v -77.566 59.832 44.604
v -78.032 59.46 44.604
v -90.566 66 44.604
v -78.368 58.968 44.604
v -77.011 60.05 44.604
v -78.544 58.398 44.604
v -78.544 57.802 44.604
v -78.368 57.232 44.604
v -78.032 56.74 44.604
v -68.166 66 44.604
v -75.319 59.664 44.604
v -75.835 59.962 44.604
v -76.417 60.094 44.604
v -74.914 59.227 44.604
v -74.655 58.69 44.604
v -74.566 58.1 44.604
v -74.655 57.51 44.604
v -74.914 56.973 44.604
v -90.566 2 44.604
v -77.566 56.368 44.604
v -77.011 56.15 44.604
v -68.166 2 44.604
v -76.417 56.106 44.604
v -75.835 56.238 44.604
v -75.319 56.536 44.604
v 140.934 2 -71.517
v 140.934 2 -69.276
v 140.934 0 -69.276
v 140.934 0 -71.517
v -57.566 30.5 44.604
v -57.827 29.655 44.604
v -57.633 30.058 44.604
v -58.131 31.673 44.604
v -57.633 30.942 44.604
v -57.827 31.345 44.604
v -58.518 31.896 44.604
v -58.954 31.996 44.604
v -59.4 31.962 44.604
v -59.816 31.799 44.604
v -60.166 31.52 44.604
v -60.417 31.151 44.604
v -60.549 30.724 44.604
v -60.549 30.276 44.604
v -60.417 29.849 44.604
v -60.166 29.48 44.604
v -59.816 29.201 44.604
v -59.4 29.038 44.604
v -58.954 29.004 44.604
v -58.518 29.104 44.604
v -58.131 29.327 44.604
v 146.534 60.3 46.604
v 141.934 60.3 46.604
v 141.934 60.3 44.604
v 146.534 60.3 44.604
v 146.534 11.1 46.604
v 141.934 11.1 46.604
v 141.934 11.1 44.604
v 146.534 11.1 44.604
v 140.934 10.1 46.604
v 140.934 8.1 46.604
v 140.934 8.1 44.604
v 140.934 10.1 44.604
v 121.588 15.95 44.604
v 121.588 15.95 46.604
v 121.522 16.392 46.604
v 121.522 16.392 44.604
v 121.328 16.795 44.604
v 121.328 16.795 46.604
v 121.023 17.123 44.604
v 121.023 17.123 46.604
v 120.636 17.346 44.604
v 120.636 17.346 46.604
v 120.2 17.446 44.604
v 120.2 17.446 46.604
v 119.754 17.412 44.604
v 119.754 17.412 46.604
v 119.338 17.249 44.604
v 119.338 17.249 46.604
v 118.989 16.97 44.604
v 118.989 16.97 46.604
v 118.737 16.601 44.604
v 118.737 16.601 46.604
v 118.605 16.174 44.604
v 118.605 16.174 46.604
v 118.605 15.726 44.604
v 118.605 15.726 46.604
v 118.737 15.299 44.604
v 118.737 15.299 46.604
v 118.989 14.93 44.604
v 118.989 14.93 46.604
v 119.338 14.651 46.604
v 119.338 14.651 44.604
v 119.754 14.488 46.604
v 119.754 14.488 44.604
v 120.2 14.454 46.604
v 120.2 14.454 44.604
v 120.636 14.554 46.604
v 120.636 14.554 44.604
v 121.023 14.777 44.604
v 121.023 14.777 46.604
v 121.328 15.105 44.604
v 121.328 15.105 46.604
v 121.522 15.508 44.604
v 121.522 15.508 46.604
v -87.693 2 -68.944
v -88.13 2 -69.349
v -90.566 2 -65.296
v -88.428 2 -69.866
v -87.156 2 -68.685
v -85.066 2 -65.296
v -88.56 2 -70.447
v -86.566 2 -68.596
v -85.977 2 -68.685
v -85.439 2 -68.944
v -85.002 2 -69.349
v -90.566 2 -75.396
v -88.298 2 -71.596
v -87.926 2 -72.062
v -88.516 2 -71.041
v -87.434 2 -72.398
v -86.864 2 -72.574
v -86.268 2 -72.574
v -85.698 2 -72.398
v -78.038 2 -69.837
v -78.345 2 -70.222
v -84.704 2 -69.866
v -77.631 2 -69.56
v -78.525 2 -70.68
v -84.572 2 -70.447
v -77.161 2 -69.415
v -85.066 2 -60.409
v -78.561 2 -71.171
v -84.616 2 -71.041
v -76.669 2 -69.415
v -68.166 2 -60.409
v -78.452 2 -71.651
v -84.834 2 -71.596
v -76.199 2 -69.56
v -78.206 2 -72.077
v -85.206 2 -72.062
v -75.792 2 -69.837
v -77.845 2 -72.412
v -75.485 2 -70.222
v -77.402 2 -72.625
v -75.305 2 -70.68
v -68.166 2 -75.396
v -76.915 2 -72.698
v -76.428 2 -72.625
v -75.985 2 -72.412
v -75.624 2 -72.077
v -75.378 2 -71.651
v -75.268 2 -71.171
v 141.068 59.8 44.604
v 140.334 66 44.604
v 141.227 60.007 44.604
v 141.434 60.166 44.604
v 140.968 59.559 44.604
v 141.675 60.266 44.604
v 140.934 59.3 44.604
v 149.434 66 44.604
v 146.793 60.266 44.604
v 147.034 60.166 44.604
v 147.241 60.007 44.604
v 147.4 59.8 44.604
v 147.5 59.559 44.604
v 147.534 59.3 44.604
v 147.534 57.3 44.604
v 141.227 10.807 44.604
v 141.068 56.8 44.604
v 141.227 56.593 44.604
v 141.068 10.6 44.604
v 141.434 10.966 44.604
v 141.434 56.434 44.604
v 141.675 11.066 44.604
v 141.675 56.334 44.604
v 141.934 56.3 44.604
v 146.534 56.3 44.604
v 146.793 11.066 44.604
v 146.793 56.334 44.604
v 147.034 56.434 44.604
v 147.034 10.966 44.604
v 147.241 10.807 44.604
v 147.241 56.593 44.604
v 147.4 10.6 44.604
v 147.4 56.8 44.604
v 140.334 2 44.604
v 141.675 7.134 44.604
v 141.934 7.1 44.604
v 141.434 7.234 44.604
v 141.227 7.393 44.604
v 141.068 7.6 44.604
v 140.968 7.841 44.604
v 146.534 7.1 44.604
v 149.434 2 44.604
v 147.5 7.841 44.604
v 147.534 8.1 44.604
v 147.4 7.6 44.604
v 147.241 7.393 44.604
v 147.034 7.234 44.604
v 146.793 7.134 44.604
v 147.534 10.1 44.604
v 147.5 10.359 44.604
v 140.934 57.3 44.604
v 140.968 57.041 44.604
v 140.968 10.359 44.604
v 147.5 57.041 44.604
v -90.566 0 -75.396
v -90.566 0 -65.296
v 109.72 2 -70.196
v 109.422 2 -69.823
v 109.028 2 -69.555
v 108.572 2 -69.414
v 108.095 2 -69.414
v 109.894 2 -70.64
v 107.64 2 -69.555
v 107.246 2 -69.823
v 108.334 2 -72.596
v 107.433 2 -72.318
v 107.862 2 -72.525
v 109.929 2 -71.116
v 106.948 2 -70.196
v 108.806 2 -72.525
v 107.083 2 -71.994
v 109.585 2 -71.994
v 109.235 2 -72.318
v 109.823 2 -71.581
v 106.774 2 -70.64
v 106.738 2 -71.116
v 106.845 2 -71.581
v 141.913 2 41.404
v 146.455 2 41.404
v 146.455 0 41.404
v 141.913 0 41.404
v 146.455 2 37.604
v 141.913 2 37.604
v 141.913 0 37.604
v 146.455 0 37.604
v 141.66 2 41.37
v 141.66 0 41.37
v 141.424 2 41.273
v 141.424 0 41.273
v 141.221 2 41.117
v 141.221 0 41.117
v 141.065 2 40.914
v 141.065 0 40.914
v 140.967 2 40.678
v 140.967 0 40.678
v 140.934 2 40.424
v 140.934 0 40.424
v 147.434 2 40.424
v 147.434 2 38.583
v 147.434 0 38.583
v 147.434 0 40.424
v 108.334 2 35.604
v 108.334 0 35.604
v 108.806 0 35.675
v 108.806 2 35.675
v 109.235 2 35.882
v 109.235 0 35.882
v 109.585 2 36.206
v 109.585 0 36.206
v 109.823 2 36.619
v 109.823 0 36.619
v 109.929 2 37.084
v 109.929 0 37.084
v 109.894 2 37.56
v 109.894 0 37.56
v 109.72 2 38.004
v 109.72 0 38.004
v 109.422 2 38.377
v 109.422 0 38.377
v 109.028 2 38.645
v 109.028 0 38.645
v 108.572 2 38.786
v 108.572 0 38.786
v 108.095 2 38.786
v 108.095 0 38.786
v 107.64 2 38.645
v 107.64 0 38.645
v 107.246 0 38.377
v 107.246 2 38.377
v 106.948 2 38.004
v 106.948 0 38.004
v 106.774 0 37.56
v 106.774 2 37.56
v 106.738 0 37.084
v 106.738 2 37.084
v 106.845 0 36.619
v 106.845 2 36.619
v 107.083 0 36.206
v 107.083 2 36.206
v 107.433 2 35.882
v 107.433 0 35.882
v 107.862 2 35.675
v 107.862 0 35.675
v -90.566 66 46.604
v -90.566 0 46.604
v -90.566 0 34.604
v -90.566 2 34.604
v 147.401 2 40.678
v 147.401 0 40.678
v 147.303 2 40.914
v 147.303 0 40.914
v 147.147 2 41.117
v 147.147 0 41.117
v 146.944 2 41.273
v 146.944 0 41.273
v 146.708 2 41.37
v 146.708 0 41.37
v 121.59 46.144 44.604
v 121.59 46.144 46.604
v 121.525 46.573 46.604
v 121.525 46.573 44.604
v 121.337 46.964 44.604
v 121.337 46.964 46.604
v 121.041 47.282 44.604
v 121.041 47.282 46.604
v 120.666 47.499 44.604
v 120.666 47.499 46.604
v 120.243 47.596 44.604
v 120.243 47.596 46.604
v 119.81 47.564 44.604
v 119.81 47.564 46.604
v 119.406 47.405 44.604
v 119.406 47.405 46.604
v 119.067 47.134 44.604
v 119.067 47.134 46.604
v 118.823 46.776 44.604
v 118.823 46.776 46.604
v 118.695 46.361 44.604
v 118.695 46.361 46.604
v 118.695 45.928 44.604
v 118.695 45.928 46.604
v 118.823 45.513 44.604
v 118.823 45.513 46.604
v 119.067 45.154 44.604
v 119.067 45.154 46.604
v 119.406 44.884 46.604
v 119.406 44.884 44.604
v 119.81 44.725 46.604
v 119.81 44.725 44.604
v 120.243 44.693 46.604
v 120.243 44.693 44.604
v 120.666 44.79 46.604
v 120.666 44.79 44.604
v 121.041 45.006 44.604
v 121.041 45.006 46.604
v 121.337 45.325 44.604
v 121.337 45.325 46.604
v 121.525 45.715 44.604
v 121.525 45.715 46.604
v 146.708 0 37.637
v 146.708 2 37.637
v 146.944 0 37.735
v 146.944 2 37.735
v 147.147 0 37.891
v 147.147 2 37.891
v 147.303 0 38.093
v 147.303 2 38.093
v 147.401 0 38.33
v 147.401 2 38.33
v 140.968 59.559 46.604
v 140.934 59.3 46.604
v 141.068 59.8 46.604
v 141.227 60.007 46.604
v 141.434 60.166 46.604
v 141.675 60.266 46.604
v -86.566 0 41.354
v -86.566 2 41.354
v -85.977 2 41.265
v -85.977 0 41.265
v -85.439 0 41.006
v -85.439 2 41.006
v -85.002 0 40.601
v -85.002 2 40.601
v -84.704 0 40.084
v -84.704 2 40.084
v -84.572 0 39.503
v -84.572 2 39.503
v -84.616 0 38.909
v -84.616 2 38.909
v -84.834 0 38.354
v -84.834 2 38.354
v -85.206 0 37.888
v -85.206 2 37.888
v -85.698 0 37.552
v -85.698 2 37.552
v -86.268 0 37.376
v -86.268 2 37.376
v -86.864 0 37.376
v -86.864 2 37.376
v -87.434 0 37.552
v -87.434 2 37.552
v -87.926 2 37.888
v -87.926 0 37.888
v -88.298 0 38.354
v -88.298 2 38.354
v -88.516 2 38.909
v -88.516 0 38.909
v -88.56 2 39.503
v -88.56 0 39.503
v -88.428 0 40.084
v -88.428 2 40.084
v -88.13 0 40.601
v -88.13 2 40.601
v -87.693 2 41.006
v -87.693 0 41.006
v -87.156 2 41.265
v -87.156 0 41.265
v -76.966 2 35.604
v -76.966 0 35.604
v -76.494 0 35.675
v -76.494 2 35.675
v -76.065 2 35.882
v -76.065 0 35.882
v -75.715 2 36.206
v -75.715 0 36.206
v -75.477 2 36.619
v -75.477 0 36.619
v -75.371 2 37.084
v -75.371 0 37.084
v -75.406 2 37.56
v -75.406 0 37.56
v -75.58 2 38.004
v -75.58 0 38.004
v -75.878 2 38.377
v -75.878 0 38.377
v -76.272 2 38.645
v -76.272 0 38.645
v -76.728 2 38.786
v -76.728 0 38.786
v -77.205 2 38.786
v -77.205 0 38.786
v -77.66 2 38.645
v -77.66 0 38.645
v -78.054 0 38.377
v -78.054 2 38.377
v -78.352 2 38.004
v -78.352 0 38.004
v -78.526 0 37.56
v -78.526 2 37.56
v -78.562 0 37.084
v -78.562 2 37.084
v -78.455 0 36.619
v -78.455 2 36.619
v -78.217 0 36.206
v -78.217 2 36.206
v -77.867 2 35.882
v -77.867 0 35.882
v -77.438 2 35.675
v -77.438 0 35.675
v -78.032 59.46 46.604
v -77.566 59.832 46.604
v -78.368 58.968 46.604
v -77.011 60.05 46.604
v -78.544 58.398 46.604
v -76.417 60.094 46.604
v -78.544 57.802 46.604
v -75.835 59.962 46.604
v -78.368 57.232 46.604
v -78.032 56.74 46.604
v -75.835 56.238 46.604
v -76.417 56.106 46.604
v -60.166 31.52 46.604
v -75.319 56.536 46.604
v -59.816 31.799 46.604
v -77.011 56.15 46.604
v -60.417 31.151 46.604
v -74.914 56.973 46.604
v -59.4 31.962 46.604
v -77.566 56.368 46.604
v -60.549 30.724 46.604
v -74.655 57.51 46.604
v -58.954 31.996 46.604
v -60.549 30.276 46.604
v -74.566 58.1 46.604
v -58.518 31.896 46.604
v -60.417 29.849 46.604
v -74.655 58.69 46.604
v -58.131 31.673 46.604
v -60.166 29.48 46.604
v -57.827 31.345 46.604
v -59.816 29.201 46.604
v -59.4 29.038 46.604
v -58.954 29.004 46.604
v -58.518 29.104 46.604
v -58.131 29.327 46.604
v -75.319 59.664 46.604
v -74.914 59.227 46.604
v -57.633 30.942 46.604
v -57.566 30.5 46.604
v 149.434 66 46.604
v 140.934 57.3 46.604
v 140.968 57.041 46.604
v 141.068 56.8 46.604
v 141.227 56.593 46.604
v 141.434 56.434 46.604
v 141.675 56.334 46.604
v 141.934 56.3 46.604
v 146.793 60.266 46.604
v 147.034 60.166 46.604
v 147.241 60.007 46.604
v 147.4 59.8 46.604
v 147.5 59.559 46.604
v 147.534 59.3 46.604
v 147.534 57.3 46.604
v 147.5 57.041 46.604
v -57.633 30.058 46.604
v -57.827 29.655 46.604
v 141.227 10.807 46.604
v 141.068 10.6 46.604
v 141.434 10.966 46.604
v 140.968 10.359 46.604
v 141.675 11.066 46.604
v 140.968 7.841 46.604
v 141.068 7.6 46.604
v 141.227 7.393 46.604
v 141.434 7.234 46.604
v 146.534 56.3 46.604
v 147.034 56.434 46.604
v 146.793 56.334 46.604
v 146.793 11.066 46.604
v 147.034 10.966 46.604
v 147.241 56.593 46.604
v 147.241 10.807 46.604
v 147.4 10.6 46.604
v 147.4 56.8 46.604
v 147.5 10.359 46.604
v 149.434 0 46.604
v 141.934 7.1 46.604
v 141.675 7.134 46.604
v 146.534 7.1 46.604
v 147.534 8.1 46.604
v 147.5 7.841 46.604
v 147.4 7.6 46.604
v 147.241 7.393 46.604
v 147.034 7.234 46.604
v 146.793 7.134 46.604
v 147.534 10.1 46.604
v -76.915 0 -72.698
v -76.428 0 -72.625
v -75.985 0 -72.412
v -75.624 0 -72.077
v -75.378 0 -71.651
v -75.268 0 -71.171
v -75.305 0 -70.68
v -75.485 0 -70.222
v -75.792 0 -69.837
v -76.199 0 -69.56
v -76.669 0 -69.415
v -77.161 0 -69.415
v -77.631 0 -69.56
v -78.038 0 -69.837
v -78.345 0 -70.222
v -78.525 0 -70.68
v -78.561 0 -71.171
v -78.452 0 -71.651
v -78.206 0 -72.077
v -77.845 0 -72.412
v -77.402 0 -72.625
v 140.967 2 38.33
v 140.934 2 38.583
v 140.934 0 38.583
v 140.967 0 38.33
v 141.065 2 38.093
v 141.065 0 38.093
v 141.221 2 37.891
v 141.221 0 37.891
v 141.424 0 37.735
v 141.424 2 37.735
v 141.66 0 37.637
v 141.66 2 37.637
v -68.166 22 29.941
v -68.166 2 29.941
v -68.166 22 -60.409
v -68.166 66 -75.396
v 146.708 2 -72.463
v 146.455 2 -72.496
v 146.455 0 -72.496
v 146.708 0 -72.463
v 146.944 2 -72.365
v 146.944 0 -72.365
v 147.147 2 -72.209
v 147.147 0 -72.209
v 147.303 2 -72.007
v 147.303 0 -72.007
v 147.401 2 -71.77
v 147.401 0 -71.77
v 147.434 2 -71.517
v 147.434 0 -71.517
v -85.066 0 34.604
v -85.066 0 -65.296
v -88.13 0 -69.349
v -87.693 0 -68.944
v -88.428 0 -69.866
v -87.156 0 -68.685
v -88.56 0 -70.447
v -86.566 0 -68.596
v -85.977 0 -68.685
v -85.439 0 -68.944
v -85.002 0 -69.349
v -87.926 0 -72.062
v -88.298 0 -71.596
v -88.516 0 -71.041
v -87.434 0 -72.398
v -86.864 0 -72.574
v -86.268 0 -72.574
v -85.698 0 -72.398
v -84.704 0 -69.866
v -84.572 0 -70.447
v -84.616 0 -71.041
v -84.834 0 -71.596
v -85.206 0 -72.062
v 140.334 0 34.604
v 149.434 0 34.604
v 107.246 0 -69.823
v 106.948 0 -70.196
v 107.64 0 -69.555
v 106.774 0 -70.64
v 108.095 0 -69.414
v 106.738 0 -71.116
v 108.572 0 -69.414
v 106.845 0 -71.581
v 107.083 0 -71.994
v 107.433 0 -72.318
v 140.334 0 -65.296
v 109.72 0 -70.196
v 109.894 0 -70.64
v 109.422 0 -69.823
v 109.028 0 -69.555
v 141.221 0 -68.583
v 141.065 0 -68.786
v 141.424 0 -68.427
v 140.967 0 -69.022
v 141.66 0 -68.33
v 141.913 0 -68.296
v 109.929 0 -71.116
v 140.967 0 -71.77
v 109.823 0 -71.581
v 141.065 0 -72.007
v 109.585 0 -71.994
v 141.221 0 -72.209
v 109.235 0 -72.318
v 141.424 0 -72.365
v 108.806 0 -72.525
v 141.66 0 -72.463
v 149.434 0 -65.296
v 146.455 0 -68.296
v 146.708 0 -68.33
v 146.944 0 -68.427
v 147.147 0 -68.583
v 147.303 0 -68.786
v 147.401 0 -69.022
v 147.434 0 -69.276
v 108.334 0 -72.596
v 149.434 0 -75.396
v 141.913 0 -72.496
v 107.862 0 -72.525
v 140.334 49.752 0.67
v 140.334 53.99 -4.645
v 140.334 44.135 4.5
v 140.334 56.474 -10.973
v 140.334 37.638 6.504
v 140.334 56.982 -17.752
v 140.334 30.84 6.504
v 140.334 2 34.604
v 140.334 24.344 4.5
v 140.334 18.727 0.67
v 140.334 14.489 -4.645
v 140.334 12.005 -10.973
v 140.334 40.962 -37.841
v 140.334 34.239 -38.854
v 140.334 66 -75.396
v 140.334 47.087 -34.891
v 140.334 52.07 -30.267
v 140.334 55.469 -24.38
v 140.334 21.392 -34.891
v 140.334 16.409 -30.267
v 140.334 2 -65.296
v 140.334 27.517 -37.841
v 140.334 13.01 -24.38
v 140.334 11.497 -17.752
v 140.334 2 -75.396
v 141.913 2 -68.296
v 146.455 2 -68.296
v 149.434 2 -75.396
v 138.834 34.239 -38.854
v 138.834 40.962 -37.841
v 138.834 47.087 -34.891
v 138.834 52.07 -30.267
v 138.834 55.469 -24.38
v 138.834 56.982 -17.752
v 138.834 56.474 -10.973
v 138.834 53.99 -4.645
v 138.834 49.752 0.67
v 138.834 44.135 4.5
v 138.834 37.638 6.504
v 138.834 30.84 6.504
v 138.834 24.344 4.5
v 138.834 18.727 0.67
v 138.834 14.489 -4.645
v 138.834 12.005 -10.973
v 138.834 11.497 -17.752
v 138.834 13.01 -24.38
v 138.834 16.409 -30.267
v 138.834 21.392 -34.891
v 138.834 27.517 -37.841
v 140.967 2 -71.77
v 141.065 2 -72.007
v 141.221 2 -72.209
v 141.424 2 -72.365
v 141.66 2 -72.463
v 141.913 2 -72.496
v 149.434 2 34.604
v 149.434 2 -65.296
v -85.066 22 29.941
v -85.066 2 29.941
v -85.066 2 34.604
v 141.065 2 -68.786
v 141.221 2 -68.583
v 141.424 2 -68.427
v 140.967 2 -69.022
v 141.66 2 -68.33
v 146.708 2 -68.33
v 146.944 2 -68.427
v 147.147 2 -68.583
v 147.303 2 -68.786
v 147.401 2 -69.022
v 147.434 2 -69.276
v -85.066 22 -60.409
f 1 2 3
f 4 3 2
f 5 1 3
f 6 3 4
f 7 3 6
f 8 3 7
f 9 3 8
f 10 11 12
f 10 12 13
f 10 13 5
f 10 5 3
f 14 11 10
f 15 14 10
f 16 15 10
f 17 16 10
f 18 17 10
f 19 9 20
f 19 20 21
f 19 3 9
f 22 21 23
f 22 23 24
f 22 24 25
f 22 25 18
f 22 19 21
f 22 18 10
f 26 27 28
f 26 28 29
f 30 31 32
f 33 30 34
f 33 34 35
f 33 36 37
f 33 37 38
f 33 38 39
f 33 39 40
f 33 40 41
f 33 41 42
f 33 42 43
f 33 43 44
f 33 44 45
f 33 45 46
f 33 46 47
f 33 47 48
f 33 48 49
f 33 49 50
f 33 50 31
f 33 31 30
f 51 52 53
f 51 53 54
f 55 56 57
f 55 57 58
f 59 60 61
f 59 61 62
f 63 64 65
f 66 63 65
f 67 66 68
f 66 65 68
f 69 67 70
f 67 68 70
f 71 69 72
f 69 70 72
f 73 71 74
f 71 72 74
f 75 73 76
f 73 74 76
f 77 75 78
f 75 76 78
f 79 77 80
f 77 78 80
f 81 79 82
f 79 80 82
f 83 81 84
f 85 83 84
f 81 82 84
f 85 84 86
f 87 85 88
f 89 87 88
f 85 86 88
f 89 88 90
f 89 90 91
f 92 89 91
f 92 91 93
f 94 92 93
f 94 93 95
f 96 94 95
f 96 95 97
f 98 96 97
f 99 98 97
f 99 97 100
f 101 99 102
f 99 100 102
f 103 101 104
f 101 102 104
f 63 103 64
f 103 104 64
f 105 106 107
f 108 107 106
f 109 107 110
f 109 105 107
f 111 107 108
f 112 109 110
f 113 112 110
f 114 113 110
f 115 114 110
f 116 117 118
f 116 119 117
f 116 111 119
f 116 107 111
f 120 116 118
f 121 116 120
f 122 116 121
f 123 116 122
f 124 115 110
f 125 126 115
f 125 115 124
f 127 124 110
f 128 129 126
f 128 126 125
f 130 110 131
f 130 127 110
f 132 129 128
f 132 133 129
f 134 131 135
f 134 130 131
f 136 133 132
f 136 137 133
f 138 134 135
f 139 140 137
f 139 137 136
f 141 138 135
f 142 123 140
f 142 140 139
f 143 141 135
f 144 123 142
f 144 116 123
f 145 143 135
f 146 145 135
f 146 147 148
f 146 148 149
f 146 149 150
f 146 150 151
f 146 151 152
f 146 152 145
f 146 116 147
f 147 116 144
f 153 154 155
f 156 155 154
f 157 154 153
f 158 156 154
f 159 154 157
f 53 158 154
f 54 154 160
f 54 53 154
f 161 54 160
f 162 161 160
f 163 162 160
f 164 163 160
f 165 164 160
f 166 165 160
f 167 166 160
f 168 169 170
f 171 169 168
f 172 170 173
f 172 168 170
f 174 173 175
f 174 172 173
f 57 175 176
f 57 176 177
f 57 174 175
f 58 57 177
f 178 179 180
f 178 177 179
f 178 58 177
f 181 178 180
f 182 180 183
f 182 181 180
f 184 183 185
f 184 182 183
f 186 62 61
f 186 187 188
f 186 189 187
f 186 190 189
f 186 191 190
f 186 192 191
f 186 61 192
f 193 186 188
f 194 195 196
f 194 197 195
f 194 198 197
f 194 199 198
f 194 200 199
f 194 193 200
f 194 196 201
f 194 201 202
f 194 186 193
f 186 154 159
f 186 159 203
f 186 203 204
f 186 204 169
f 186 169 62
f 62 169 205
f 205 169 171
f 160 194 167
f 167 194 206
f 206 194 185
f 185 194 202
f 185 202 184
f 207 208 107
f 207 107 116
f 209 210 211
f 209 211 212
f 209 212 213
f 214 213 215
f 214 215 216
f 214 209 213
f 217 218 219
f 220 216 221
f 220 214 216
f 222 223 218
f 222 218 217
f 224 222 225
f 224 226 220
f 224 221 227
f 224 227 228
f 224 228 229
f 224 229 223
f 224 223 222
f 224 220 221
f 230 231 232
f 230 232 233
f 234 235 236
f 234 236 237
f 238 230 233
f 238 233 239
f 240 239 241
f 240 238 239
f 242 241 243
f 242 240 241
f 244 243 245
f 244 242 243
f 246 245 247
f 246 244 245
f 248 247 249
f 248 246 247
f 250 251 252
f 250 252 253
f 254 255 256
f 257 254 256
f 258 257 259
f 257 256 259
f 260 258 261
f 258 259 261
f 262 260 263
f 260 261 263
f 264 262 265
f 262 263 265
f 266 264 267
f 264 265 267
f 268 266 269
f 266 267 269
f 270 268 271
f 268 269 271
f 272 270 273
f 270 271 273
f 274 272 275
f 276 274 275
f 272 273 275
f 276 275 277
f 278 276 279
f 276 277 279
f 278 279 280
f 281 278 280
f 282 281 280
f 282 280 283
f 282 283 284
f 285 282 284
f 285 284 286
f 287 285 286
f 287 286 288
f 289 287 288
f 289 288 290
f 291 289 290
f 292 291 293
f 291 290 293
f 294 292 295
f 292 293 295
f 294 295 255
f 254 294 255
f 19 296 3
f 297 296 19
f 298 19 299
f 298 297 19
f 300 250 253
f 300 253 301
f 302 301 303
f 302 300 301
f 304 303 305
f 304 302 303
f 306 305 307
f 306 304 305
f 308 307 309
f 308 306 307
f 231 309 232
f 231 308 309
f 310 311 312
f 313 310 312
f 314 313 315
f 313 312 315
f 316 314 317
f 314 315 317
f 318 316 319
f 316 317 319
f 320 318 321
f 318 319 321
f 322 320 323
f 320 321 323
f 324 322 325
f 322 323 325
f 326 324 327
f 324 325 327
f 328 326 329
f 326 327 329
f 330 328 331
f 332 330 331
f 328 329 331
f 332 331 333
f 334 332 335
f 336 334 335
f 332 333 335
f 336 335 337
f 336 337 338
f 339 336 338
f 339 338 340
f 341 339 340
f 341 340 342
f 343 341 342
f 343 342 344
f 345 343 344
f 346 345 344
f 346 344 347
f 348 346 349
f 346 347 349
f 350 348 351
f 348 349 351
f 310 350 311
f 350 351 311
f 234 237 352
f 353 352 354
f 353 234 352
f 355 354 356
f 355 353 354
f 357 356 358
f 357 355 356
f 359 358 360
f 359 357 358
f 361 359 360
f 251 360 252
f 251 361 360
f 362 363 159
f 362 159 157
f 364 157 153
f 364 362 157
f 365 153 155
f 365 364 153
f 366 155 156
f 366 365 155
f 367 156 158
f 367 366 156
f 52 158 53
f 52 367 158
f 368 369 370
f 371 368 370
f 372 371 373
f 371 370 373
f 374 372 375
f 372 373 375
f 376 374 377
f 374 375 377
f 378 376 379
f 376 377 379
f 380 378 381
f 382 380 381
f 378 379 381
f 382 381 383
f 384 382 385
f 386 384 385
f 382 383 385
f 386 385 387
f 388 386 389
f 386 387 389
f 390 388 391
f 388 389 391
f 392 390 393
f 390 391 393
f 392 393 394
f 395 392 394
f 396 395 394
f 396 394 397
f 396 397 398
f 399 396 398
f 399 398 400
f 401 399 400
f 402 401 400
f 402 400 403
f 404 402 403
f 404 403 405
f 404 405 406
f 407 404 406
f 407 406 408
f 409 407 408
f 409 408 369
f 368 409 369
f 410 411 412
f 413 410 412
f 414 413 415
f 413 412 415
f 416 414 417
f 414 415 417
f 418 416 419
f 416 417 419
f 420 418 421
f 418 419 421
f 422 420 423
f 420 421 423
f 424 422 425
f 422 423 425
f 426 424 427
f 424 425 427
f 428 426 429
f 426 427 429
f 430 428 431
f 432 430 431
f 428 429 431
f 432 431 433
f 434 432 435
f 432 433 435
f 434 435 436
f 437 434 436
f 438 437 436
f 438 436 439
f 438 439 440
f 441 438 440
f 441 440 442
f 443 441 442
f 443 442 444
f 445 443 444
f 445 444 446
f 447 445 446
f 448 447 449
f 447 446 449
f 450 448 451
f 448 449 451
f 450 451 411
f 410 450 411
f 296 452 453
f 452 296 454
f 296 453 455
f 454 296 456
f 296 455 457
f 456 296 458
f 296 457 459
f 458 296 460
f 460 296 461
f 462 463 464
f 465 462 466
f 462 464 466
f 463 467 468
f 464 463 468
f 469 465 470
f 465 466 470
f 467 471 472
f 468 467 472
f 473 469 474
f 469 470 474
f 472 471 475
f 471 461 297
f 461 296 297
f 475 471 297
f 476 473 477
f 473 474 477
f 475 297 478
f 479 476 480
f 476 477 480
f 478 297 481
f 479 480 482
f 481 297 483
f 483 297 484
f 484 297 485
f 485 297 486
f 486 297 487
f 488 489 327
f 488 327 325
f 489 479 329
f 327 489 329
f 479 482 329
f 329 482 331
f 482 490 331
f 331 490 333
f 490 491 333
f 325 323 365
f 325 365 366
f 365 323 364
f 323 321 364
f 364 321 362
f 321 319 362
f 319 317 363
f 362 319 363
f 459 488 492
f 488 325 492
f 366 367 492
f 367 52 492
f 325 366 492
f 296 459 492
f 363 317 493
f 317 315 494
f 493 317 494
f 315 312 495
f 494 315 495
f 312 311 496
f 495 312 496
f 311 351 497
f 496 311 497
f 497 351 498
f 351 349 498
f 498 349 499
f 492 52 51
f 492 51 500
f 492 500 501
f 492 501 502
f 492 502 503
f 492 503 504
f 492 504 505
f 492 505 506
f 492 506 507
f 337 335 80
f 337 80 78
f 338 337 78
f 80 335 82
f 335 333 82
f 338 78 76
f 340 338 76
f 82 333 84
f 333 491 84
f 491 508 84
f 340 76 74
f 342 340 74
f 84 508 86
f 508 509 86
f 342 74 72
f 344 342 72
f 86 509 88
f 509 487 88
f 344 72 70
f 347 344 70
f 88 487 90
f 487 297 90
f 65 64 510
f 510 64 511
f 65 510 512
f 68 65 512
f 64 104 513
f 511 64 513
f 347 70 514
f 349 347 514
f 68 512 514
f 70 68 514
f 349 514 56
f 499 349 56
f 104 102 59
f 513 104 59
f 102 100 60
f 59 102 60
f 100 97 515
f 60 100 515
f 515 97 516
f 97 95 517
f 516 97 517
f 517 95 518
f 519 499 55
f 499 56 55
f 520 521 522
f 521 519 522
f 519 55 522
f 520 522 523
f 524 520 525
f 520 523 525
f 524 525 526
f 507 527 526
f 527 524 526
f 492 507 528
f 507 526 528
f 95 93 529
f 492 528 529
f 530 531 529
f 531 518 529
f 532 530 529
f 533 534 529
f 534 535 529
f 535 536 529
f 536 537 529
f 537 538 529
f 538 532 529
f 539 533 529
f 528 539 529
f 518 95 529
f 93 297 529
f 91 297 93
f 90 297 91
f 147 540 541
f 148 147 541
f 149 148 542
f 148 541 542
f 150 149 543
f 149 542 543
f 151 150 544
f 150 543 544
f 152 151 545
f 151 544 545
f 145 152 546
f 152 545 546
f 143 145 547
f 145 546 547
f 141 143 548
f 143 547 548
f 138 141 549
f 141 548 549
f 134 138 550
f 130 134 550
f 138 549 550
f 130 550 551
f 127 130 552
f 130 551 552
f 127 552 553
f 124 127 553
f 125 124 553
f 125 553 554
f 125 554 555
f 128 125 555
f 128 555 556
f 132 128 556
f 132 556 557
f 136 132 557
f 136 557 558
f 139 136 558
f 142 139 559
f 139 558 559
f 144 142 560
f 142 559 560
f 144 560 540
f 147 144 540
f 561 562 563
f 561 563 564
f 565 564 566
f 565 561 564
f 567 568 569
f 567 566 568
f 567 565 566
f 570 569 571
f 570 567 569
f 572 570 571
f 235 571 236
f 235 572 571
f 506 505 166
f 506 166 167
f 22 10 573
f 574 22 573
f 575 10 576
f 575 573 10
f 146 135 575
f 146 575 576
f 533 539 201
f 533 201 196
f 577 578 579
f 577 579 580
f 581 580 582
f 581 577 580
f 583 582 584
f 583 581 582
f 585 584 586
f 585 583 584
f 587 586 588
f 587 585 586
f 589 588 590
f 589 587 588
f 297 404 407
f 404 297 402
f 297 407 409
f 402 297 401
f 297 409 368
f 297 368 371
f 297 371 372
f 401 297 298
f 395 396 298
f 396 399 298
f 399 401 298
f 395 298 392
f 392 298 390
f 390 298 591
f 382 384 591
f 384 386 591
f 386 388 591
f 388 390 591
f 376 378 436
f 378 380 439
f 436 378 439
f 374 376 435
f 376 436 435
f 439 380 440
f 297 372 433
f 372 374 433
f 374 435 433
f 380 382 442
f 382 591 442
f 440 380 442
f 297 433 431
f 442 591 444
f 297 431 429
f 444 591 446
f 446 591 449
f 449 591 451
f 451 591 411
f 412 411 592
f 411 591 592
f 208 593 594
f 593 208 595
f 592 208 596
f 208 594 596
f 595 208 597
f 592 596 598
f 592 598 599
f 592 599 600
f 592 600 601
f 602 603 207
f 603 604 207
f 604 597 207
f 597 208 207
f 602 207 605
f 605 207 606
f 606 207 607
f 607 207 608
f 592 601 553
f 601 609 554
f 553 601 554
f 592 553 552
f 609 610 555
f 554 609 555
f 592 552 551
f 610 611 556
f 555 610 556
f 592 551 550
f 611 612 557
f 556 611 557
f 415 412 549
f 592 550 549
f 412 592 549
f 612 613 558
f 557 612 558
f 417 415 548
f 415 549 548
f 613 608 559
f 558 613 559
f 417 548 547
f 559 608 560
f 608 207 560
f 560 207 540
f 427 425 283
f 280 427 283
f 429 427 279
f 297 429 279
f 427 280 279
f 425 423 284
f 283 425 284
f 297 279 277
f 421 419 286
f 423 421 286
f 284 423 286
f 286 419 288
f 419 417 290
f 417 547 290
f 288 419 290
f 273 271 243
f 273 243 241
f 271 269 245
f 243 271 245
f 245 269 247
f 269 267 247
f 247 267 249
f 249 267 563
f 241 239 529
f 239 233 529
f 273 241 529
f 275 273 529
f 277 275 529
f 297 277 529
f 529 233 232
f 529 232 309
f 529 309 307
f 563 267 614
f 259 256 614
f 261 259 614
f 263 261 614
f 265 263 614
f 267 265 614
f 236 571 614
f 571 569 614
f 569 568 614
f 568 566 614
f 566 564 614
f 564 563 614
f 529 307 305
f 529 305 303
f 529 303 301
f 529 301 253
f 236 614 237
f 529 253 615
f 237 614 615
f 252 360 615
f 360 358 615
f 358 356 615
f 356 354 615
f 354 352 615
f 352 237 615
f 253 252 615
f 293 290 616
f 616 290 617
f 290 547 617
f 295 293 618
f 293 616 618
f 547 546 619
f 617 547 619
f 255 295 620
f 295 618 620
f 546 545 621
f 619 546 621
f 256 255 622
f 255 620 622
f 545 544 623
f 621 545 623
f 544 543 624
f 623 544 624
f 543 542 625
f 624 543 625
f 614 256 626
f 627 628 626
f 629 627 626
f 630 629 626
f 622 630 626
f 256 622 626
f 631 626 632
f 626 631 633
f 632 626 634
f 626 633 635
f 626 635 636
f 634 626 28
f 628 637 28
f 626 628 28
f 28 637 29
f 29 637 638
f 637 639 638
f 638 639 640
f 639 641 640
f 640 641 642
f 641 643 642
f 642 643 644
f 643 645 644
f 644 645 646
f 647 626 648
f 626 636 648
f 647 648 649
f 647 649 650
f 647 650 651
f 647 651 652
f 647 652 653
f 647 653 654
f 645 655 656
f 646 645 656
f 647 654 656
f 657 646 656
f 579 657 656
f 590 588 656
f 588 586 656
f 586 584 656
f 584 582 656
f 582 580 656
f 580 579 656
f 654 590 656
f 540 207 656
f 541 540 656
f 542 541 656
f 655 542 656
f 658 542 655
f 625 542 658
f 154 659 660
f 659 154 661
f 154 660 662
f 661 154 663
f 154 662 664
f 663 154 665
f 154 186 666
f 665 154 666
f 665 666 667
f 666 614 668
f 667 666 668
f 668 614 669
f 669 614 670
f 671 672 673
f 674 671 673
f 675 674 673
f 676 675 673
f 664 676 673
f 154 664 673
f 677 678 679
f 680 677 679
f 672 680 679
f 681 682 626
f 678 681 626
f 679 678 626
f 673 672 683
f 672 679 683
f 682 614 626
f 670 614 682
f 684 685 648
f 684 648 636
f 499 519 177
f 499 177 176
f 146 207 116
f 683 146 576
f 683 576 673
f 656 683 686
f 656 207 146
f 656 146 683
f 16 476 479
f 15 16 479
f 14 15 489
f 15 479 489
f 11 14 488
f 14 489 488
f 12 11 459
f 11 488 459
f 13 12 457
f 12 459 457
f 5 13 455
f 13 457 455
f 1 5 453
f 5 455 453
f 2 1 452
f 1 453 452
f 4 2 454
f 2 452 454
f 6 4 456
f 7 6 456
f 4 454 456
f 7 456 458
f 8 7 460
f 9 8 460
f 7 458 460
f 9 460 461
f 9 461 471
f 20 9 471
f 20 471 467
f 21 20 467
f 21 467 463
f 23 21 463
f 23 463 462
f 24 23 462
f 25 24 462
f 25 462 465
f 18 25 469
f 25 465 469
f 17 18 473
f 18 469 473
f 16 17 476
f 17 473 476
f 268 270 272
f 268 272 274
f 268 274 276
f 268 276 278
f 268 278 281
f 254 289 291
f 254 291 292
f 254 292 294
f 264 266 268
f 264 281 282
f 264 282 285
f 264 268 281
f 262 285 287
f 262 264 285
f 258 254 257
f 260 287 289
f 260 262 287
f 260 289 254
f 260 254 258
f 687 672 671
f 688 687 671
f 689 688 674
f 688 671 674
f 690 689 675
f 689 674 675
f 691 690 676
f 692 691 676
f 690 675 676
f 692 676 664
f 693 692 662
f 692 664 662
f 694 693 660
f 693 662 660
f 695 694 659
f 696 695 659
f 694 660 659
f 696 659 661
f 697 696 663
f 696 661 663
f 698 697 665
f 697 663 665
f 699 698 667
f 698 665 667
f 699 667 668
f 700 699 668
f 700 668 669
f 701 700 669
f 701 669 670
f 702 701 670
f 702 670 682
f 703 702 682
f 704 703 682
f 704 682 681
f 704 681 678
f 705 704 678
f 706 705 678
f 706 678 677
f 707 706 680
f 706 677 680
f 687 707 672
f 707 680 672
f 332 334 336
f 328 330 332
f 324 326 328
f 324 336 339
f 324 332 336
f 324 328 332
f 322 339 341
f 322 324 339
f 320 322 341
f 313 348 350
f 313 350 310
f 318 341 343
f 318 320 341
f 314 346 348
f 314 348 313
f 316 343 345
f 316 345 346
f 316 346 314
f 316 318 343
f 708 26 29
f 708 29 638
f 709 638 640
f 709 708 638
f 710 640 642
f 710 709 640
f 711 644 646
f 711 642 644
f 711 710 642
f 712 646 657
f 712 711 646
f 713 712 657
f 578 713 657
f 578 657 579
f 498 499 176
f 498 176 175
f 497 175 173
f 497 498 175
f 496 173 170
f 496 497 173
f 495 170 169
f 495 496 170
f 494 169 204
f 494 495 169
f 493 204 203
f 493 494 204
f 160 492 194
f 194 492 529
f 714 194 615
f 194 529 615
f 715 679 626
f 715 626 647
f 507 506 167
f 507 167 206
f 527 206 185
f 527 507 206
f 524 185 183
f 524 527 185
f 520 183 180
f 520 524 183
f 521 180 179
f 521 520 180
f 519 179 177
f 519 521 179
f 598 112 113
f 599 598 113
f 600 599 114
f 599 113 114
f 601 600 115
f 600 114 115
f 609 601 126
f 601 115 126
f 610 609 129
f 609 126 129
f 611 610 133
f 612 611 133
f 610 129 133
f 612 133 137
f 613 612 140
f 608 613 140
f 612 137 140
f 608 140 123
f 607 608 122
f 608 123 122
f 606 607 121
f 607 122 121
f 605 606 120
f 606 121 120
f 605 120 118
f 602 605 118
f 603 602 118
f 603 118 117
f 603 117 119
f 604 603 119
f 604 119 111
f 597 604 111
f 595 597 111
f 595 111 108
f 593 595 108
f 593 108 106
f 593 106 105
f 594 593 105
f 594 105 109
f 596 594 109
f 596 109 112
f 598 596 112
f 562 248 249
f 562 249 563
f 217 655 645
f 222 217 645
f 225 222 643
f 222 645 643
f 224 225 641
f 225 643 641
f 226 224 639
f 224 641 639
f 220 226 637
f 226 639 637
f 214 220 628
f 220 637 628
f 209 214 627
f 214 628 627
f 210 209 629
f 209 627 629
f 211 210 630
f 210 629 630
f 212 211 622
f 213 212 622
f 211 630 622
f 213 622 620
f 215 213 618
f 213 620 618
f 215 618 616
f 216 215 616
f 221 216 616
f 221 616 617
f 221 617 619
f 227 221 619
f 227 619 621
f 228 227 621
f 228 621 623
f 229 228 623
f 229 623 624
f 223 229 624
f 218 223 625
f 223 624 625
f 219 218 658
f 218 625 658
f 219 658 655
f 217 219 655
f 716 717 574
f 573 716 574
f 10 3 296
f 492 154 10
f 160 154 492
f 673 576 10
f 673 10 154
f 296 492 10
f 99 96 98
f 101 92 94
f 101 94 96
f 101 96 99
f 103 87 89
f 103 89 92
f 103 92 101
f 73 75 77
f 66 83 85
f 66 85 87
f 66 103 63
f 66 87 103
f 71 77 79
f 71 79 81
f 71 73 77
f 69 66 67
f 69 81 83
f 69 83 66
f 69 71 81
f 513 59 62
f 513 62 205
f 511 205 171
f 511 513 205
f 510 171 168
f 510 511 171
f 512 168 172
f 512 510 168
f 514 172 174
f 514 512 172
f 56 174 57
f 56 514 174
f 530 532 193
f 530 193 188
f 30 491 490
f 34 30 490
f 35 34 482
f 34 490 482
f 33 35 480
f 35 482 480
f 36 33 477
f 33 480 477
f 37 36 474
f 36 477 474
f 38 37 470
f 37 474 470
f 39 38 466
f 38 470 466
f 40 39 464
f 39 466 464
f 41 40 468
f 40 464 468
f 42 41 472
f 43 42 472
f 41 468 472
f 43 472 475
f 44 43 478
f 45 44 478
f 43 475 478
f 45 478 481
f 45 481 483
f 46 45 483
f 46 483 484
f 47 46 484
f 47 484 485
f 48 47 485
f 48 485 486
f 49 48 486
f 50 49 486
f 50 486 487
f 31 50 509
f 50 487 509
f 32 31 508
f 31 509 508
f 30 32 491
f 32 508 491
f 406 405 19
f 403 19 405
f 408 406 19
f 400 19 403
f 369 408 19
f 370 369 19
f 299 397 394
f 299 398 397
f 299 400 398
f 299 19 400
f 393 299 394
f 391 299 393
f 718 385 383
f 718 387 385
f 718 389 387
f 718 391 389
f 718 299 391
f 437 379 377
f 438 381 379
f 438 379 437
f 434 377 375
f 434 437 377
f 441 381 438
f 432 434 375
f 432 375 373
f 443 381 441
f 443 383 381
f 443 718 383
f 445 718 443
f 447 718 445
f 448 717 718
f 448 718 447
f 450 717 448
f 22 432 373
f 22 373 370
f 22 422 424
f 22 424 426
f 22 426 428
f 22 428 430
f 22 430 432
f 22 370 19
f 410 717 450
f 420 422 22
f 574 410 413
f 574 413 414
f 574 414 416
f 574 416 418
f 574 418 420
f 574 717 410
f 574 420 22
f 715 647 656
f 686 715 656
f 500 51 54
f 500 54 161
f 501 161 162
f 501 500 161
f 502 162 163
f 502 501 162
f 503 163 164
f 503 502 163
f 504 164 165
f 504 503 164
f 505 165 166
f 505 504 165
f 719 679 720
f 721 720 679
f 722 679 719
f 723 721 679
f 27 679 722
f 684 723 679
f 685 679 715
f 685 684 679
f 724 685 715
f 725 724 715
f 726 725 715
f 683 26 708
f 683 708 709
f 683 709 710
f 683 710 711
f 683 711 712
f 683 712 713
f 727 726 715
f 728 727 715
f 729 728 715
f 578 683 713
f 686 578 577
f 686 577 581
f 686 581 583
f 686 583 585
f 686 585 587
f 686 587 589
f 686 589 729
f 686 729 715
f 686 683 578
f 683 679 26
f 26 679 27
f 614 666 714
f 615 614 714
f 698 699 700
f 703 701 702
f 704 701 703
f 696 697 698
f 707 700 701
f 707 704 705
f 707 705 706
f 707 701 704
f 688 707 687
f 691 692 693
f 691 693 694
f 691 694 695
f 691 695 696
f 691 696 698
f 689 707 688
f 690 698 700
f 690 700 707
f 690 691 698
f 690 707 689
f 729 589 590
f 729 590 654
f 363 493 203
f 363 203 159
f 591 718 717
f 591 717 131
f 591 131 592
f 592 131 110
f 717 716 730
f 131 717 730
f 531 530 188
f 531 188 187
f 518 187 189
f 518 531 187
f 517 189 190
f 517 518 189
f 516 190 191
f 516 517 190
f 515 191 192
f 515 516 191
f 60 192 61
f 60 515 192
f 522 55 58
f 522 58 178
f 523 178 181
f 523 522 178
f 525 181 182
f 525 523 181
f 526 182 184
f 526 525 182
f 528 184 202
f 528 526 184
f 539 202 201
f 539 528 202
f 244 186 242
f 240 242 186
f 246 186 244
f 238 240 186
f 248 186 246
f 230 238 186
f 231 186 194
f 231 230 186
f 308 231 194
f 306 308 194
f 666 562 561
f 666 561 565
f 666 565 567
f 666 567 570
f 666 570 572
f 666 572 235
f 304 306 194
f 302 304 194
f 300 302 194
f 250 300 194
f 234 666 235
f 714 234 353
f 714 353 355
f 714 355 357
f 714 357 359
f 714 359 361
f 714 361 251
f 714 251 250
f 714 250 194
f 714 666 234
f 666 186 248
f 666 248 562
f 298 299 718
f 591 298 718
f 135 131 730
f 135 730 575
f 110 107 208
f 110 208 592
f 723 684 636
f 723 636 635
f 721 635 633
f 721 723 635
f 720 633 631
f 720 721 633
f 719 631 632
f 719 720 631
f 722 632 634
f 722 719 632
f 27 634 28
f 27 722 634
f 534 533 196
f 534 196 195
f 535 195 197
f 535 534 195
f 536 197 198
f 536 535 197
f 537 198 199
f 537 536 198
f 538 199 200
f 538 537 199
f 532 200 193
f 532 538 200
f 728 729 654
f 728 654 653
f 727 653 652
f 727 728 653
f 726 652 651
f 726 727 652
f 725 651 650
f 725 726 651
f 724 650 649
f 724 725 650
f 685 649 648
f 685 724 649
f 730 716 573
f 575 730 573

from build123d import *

# Parameters (mm, degrees)
SZKIC1_W                    = 240
SZKIC1_H                    = 122
DODANIE_WYCI_GNI_CIE1_DEPTH = 2
SZKIC2_W                    = 240
SZKIC2_H                    = 2
DODANIE_WYCI_GNI_CIE2_DEPTH = 64
SZKIC3_W                    = 9.1
SZKIC3_H                    = 99.9
SZKIC3_W_2                  = 5.5
WYTNIJ_WYCI_GNI_CIE1_DEPTH  = 180.195703173
SZKIC4_W                    = 208.5
SZKIC4_H                    = 120
DODANIE_WYCI_GNI_CIE3_DEPTH = 64
SZKIC5_R                    = 22.806294832
WYTNIJ_WYCI_GNI_CIE2_DEPTH  = 1.5
SZKIC6_W                    = 16.9
SZKIC6_H                    = 90.349503158
DODANIE_WYCI_GNI_CIE4_DEPTH = 20
WYTNIJ_WYCI_GNI_CIE3_DEPTH  = 180.195703173
SZKIC8_R                    = 2
WYTNIJ_WYCI_GNI_CIE4_DEPTH  = 180.195703173
SZKIC9_R                    = 1.6
SZKIC9_R_2                  = 1.651116854
WYTNIJ_WYCI_GNI_CIE5_DEPTH  = 2
SZKIC10_R                   = 2
WYTNIJ_WYCI_GNI_CIE6_DEPTH  = 2
SZKIC11_R                   = 1.455539738
SZKIC11_R_2                 = 1.5
WYTNIJ_WYCI_GNI_CIE7_DEPTH  = 2


with BuildPart() as part:
    # Szkic1 → Dodanie-wyciągnięcie1 (new body)
    with BuildSketch(Plane(origin=(0, 0, 0), x_dir=(1, 0, 0), z_dir=(0, 1, 0))):
        with Locations((29.433962264, 14.396226415)):
            Rectangle(SZKIC1_W, SZKIC1_H)
    extrude(amount=DODANIE_WYCI_GNI_CIE1_DEPTH)

    # Szkic2 → Dodanie-wyciągnięcie2 (add)
    with BuildSketch(Plane(origin=(0, 2, 0), x_dir=(1, 0, 0), z_dir=(0, 1, 0))):
        with Locations((29.433962264, -45.603773585)):
            Rectangle(SZKIC2_W, SZKIC2_H)
    extrude(amount=DODANIE_WYCI_GNI_CIE2_DEPTH)

    # Szkic3 → Wytnij-wyciągnięcie1 (cut, through all)
    with BuildSketch(Plane(origin=(0, 2, 0), x_dir=(1, 0, 0), z_dir=(0, 1, 0))):
        with Locations((144.883962264, 15.346226415)):
            Rectangle(SZKIC3_W, SZKIC3_H)
        with Locations((-87.816037736, 15.346226415)):
            Rectangle(SZKIC3_W_2, SZKIC3_H)
    extrude(amount=-WYTNIJ_WYCI_GNI_CIE1_DEPTH, mode=Mode.SUBTRACT)

    # Szkic4 → Dodanie-wyciągnięcie3 (add)
    with BuildSketch(Plane(origin=(0, 2, 0), x_dir=(1, 0, 0), z_dir=(0, 1, 0))):
        with Locations((36.083962264, 15.396226415)):
            Rectangle(SZKIC4_W, SZKIC4_H)
    extrude(amount=DODANIE_WYCI_GNI_CIE3_DEPTH)

    # Szkic5 → Wytnij-wyciągnięcie2 (cut)
    with BuildSketch(Plane(origin=(140.333962264, 0, 0), x_dir=(0, 0, -1), z_dir=(1, 0, 0))):
        with Locations((16.047891544, 34.239354483)):
            Circle(SZKIC5_R)
    extrude(amount=-WYTNIJ_WYCI_GNI_CIE2_DEPTH, mode=Mode.SUBTRACT)

    # Szkic6 → Dodanie-wyciągnięcie4 (add)
    with BuildSketch(Plane(origin=(0, 2, 0), x_dir=(1, 0, 0), z_dir=(0, 1, 0))):
        with Locations((-76.616037736, 15.234150699)):
            Rectangle(SZKIC6_W, SZKIC6_H)
    extrude(amount=DODANIE_WYCI_GNI_CIE4_DEPTH)

    # Szkic7 → Wytnij-wyciągnięcie3 (cut, through all)
    with BuildSketch(Plane(origin=(0, 2, 0), x_dir=(1, 0, 0), z_dir=(0, 1, 0))):
        with BuildLine():
            Line((141.913386631, 72.496226415), (146.454537897, 72.496226415))
            ThreePointArc((146.454537897, 72.496226415), (147.147095509, 72.20935966), (147.433962264, 71.516802048))
            Line((147.433962264, 71.516802048), (147.433962264, 69.275650782))
            ThreePointArc((147.433962264, 69.275650782), (147.147095509, 68.583093171), (146.454537897, 68.296226415))
            Line((146.454537897, 68.296226415), (141.913386631, 68.296226415))
            ThreePointArc((141.913386631, 68.296226415), (141.22082902, 68.583093171), (140.933962264, 69.275650782))
            Line((140.933962264, 69.275650782), (140.933962264, 71.516802048))
            ThreePointArc((140.933962264, 71.516802048), (141.22082902, 72.20935966), (141.913386631, 72.496226415))
        make_face()
        with BuildLine():
            Line((141.913386631, -37.603773585), (146.454537897, -37.603773585))
            ThreePointArc((146.454537897, -37.603773585), (147.147095509, -37.89064034), (147.433962264, -38.583197952))
            Line((147.433962264, -38.583197952), (147.433962264, -40.424349218))
            ThreePointArc((147.433962264, -40.424349218), (147.147095509, -41.116906829), (146.454537897, -41.403773585))
            Line((146.454537897, -41.403773585), (141.913386631, -41.403773585))
            ThreePointArc((141.913386631, -41.403773585), (141.22082902, -41.116906829), (140.933962264, -40.424349218))
            Line((140.933962264, -40.424349218), (140.933962264, -38.583197952))
            ThreePointArc((140.933962264, -38.583197952), (141.22082902, -37.89064034), (141.913386631, -37.603773585))
        make_face()
    extrude(amount=-WYTNIJ_WYCI_GNI_CIE3_DEPTH, mode=Mode.SUBTRACT)

    # Szkic8 → Wytnij-wyciągnięcie4 (cut, through all)
    with BuildSketch(Plane(origin=(0, 2, 0), x_dir=(1, 0, 0), z_dir=(0, 1, 0))):
        with Locations(Location((-86.566037736, 70.596226415, 0), (0, 0, 270))):
            Circle(SZKIC8_R)
        with Locations(Location((-86.566037736, -39.353773585, 0), (0, 0, 270))):
            Circle(SZKIC8_R)
    extrude(amount=-WYTNIJ_WYCI_GNI_CIE4_DEPTH, mode=Mode.SUBTRACT)

    # Szkic9 → Wytnij-wyciągnięcie5 (cut)
    with BuildSketch(Plane.XZ):
        with Locations(Location((-76.966037736, 37.203773585, 0), (0, 0, 270))):
            Circle(SZKIC9_R)
        with Locations(Location((108.333962264, 37.203773585, 0), (0, 0, 270))):
            Circle(SZKIC9_R)
        with Locations(Location((108.333962264, -70.996226415, 0), (0, 0, 270))):
            Circle(SZKIC9_R)
        with Locations(Location((-76.914920882, -71.047343269, 0), (0, 0, 270))):
            Circle(SZKIC9_R_2)
    extrude(amount=-WYTNIJ_WYCI_GNI_CIE5_DEPTH, mode=Mode.SUBTRACT)

    # Szkic10 → Wytnij-wyciągnięcie6 (cut)
    with BuildSketch(Plane.XY.offset(46.603773585)):
        with Locations((-76.566037736, 58.1)):
            Circle(SZKIC10_R)
        with BuildLine():
            Line((141.933962264, 60.3), (146.533962264, 60.3))
            ThreePointArc((146.533962264, 60.3), (147.241069045, 60.007106781), (147.533962264, 59.3))
            Line((147.533962264, 59.3), (147.533962264, 57.3))
            ThreePointArc((147.533962264, 57.3), (147.241069045, 56.592893219), (146.533962264, 56.3))
            Line((146.533962264, 56.3), (141.933962264, 56.3))
            ThreePointArc((141.933962264, 56.3), (141.226855483, 56.592893219), (140.933962264, 57.3))
            Line((140.933962264, 57.3), (140.933962264, 59.3))
            ThreePointArc((140.933962264, 59.3), (141.226855483, 60.007106781), (141.933962264, 60.3))
        make_face()
        with BuildLine():
            Line((141.933962264, 11.1), (146.533962264, 11.1))
            ThreePointArc((146.533962264, 11.1), (147.241069045, 10.807106781), (147.533962264, 10.1))
            Line((147.533962264, 10.1), (147.533962264, 8.1))
            ThreePointArc((147.533962264, 8.1), (147.241069045, 7.392893219), (146.533962264, 7.1))
            Line((146.533962264, 7.1), (141.933962264, 7.1))
            ThreePointArc((141.933962264, 7.1), (141.226855483, 7.392893219), (140.933962264, 8.1))
            Line((140.933962264, 8.1), (140.933962264, 10.1))
            ThreePointArc((140.933962264, 10.1), (141.226855483, 10.807106781), (141.933962264, 11.1))
        make_face()
    extrude(amount=-WYTNIJ_WYCI_GNI_CIE6_DEPTH, mode=Mode.SUBTRACT)

    # Szkic11 → Wytnij-wyciągnięcie7 (cut)
    with BuildSketch(Plane.XY.offset(46.603773585)):
        with Locations((120.133962264, 46.144460262)):
            Circle(SZKIC11_R)
        with Locations((120.088143939, 15.95)):
            Circle(SZKIC11_R_2)
        with Locations((-59.066037736, 30.5)):
            Circle(SZKIC11_R_2)
    extrude(amount=-WYTNIJ_WYCI_GNI_CIE7_DEPTH, mode=Mode.SUBTRACT)


solid = part.part
